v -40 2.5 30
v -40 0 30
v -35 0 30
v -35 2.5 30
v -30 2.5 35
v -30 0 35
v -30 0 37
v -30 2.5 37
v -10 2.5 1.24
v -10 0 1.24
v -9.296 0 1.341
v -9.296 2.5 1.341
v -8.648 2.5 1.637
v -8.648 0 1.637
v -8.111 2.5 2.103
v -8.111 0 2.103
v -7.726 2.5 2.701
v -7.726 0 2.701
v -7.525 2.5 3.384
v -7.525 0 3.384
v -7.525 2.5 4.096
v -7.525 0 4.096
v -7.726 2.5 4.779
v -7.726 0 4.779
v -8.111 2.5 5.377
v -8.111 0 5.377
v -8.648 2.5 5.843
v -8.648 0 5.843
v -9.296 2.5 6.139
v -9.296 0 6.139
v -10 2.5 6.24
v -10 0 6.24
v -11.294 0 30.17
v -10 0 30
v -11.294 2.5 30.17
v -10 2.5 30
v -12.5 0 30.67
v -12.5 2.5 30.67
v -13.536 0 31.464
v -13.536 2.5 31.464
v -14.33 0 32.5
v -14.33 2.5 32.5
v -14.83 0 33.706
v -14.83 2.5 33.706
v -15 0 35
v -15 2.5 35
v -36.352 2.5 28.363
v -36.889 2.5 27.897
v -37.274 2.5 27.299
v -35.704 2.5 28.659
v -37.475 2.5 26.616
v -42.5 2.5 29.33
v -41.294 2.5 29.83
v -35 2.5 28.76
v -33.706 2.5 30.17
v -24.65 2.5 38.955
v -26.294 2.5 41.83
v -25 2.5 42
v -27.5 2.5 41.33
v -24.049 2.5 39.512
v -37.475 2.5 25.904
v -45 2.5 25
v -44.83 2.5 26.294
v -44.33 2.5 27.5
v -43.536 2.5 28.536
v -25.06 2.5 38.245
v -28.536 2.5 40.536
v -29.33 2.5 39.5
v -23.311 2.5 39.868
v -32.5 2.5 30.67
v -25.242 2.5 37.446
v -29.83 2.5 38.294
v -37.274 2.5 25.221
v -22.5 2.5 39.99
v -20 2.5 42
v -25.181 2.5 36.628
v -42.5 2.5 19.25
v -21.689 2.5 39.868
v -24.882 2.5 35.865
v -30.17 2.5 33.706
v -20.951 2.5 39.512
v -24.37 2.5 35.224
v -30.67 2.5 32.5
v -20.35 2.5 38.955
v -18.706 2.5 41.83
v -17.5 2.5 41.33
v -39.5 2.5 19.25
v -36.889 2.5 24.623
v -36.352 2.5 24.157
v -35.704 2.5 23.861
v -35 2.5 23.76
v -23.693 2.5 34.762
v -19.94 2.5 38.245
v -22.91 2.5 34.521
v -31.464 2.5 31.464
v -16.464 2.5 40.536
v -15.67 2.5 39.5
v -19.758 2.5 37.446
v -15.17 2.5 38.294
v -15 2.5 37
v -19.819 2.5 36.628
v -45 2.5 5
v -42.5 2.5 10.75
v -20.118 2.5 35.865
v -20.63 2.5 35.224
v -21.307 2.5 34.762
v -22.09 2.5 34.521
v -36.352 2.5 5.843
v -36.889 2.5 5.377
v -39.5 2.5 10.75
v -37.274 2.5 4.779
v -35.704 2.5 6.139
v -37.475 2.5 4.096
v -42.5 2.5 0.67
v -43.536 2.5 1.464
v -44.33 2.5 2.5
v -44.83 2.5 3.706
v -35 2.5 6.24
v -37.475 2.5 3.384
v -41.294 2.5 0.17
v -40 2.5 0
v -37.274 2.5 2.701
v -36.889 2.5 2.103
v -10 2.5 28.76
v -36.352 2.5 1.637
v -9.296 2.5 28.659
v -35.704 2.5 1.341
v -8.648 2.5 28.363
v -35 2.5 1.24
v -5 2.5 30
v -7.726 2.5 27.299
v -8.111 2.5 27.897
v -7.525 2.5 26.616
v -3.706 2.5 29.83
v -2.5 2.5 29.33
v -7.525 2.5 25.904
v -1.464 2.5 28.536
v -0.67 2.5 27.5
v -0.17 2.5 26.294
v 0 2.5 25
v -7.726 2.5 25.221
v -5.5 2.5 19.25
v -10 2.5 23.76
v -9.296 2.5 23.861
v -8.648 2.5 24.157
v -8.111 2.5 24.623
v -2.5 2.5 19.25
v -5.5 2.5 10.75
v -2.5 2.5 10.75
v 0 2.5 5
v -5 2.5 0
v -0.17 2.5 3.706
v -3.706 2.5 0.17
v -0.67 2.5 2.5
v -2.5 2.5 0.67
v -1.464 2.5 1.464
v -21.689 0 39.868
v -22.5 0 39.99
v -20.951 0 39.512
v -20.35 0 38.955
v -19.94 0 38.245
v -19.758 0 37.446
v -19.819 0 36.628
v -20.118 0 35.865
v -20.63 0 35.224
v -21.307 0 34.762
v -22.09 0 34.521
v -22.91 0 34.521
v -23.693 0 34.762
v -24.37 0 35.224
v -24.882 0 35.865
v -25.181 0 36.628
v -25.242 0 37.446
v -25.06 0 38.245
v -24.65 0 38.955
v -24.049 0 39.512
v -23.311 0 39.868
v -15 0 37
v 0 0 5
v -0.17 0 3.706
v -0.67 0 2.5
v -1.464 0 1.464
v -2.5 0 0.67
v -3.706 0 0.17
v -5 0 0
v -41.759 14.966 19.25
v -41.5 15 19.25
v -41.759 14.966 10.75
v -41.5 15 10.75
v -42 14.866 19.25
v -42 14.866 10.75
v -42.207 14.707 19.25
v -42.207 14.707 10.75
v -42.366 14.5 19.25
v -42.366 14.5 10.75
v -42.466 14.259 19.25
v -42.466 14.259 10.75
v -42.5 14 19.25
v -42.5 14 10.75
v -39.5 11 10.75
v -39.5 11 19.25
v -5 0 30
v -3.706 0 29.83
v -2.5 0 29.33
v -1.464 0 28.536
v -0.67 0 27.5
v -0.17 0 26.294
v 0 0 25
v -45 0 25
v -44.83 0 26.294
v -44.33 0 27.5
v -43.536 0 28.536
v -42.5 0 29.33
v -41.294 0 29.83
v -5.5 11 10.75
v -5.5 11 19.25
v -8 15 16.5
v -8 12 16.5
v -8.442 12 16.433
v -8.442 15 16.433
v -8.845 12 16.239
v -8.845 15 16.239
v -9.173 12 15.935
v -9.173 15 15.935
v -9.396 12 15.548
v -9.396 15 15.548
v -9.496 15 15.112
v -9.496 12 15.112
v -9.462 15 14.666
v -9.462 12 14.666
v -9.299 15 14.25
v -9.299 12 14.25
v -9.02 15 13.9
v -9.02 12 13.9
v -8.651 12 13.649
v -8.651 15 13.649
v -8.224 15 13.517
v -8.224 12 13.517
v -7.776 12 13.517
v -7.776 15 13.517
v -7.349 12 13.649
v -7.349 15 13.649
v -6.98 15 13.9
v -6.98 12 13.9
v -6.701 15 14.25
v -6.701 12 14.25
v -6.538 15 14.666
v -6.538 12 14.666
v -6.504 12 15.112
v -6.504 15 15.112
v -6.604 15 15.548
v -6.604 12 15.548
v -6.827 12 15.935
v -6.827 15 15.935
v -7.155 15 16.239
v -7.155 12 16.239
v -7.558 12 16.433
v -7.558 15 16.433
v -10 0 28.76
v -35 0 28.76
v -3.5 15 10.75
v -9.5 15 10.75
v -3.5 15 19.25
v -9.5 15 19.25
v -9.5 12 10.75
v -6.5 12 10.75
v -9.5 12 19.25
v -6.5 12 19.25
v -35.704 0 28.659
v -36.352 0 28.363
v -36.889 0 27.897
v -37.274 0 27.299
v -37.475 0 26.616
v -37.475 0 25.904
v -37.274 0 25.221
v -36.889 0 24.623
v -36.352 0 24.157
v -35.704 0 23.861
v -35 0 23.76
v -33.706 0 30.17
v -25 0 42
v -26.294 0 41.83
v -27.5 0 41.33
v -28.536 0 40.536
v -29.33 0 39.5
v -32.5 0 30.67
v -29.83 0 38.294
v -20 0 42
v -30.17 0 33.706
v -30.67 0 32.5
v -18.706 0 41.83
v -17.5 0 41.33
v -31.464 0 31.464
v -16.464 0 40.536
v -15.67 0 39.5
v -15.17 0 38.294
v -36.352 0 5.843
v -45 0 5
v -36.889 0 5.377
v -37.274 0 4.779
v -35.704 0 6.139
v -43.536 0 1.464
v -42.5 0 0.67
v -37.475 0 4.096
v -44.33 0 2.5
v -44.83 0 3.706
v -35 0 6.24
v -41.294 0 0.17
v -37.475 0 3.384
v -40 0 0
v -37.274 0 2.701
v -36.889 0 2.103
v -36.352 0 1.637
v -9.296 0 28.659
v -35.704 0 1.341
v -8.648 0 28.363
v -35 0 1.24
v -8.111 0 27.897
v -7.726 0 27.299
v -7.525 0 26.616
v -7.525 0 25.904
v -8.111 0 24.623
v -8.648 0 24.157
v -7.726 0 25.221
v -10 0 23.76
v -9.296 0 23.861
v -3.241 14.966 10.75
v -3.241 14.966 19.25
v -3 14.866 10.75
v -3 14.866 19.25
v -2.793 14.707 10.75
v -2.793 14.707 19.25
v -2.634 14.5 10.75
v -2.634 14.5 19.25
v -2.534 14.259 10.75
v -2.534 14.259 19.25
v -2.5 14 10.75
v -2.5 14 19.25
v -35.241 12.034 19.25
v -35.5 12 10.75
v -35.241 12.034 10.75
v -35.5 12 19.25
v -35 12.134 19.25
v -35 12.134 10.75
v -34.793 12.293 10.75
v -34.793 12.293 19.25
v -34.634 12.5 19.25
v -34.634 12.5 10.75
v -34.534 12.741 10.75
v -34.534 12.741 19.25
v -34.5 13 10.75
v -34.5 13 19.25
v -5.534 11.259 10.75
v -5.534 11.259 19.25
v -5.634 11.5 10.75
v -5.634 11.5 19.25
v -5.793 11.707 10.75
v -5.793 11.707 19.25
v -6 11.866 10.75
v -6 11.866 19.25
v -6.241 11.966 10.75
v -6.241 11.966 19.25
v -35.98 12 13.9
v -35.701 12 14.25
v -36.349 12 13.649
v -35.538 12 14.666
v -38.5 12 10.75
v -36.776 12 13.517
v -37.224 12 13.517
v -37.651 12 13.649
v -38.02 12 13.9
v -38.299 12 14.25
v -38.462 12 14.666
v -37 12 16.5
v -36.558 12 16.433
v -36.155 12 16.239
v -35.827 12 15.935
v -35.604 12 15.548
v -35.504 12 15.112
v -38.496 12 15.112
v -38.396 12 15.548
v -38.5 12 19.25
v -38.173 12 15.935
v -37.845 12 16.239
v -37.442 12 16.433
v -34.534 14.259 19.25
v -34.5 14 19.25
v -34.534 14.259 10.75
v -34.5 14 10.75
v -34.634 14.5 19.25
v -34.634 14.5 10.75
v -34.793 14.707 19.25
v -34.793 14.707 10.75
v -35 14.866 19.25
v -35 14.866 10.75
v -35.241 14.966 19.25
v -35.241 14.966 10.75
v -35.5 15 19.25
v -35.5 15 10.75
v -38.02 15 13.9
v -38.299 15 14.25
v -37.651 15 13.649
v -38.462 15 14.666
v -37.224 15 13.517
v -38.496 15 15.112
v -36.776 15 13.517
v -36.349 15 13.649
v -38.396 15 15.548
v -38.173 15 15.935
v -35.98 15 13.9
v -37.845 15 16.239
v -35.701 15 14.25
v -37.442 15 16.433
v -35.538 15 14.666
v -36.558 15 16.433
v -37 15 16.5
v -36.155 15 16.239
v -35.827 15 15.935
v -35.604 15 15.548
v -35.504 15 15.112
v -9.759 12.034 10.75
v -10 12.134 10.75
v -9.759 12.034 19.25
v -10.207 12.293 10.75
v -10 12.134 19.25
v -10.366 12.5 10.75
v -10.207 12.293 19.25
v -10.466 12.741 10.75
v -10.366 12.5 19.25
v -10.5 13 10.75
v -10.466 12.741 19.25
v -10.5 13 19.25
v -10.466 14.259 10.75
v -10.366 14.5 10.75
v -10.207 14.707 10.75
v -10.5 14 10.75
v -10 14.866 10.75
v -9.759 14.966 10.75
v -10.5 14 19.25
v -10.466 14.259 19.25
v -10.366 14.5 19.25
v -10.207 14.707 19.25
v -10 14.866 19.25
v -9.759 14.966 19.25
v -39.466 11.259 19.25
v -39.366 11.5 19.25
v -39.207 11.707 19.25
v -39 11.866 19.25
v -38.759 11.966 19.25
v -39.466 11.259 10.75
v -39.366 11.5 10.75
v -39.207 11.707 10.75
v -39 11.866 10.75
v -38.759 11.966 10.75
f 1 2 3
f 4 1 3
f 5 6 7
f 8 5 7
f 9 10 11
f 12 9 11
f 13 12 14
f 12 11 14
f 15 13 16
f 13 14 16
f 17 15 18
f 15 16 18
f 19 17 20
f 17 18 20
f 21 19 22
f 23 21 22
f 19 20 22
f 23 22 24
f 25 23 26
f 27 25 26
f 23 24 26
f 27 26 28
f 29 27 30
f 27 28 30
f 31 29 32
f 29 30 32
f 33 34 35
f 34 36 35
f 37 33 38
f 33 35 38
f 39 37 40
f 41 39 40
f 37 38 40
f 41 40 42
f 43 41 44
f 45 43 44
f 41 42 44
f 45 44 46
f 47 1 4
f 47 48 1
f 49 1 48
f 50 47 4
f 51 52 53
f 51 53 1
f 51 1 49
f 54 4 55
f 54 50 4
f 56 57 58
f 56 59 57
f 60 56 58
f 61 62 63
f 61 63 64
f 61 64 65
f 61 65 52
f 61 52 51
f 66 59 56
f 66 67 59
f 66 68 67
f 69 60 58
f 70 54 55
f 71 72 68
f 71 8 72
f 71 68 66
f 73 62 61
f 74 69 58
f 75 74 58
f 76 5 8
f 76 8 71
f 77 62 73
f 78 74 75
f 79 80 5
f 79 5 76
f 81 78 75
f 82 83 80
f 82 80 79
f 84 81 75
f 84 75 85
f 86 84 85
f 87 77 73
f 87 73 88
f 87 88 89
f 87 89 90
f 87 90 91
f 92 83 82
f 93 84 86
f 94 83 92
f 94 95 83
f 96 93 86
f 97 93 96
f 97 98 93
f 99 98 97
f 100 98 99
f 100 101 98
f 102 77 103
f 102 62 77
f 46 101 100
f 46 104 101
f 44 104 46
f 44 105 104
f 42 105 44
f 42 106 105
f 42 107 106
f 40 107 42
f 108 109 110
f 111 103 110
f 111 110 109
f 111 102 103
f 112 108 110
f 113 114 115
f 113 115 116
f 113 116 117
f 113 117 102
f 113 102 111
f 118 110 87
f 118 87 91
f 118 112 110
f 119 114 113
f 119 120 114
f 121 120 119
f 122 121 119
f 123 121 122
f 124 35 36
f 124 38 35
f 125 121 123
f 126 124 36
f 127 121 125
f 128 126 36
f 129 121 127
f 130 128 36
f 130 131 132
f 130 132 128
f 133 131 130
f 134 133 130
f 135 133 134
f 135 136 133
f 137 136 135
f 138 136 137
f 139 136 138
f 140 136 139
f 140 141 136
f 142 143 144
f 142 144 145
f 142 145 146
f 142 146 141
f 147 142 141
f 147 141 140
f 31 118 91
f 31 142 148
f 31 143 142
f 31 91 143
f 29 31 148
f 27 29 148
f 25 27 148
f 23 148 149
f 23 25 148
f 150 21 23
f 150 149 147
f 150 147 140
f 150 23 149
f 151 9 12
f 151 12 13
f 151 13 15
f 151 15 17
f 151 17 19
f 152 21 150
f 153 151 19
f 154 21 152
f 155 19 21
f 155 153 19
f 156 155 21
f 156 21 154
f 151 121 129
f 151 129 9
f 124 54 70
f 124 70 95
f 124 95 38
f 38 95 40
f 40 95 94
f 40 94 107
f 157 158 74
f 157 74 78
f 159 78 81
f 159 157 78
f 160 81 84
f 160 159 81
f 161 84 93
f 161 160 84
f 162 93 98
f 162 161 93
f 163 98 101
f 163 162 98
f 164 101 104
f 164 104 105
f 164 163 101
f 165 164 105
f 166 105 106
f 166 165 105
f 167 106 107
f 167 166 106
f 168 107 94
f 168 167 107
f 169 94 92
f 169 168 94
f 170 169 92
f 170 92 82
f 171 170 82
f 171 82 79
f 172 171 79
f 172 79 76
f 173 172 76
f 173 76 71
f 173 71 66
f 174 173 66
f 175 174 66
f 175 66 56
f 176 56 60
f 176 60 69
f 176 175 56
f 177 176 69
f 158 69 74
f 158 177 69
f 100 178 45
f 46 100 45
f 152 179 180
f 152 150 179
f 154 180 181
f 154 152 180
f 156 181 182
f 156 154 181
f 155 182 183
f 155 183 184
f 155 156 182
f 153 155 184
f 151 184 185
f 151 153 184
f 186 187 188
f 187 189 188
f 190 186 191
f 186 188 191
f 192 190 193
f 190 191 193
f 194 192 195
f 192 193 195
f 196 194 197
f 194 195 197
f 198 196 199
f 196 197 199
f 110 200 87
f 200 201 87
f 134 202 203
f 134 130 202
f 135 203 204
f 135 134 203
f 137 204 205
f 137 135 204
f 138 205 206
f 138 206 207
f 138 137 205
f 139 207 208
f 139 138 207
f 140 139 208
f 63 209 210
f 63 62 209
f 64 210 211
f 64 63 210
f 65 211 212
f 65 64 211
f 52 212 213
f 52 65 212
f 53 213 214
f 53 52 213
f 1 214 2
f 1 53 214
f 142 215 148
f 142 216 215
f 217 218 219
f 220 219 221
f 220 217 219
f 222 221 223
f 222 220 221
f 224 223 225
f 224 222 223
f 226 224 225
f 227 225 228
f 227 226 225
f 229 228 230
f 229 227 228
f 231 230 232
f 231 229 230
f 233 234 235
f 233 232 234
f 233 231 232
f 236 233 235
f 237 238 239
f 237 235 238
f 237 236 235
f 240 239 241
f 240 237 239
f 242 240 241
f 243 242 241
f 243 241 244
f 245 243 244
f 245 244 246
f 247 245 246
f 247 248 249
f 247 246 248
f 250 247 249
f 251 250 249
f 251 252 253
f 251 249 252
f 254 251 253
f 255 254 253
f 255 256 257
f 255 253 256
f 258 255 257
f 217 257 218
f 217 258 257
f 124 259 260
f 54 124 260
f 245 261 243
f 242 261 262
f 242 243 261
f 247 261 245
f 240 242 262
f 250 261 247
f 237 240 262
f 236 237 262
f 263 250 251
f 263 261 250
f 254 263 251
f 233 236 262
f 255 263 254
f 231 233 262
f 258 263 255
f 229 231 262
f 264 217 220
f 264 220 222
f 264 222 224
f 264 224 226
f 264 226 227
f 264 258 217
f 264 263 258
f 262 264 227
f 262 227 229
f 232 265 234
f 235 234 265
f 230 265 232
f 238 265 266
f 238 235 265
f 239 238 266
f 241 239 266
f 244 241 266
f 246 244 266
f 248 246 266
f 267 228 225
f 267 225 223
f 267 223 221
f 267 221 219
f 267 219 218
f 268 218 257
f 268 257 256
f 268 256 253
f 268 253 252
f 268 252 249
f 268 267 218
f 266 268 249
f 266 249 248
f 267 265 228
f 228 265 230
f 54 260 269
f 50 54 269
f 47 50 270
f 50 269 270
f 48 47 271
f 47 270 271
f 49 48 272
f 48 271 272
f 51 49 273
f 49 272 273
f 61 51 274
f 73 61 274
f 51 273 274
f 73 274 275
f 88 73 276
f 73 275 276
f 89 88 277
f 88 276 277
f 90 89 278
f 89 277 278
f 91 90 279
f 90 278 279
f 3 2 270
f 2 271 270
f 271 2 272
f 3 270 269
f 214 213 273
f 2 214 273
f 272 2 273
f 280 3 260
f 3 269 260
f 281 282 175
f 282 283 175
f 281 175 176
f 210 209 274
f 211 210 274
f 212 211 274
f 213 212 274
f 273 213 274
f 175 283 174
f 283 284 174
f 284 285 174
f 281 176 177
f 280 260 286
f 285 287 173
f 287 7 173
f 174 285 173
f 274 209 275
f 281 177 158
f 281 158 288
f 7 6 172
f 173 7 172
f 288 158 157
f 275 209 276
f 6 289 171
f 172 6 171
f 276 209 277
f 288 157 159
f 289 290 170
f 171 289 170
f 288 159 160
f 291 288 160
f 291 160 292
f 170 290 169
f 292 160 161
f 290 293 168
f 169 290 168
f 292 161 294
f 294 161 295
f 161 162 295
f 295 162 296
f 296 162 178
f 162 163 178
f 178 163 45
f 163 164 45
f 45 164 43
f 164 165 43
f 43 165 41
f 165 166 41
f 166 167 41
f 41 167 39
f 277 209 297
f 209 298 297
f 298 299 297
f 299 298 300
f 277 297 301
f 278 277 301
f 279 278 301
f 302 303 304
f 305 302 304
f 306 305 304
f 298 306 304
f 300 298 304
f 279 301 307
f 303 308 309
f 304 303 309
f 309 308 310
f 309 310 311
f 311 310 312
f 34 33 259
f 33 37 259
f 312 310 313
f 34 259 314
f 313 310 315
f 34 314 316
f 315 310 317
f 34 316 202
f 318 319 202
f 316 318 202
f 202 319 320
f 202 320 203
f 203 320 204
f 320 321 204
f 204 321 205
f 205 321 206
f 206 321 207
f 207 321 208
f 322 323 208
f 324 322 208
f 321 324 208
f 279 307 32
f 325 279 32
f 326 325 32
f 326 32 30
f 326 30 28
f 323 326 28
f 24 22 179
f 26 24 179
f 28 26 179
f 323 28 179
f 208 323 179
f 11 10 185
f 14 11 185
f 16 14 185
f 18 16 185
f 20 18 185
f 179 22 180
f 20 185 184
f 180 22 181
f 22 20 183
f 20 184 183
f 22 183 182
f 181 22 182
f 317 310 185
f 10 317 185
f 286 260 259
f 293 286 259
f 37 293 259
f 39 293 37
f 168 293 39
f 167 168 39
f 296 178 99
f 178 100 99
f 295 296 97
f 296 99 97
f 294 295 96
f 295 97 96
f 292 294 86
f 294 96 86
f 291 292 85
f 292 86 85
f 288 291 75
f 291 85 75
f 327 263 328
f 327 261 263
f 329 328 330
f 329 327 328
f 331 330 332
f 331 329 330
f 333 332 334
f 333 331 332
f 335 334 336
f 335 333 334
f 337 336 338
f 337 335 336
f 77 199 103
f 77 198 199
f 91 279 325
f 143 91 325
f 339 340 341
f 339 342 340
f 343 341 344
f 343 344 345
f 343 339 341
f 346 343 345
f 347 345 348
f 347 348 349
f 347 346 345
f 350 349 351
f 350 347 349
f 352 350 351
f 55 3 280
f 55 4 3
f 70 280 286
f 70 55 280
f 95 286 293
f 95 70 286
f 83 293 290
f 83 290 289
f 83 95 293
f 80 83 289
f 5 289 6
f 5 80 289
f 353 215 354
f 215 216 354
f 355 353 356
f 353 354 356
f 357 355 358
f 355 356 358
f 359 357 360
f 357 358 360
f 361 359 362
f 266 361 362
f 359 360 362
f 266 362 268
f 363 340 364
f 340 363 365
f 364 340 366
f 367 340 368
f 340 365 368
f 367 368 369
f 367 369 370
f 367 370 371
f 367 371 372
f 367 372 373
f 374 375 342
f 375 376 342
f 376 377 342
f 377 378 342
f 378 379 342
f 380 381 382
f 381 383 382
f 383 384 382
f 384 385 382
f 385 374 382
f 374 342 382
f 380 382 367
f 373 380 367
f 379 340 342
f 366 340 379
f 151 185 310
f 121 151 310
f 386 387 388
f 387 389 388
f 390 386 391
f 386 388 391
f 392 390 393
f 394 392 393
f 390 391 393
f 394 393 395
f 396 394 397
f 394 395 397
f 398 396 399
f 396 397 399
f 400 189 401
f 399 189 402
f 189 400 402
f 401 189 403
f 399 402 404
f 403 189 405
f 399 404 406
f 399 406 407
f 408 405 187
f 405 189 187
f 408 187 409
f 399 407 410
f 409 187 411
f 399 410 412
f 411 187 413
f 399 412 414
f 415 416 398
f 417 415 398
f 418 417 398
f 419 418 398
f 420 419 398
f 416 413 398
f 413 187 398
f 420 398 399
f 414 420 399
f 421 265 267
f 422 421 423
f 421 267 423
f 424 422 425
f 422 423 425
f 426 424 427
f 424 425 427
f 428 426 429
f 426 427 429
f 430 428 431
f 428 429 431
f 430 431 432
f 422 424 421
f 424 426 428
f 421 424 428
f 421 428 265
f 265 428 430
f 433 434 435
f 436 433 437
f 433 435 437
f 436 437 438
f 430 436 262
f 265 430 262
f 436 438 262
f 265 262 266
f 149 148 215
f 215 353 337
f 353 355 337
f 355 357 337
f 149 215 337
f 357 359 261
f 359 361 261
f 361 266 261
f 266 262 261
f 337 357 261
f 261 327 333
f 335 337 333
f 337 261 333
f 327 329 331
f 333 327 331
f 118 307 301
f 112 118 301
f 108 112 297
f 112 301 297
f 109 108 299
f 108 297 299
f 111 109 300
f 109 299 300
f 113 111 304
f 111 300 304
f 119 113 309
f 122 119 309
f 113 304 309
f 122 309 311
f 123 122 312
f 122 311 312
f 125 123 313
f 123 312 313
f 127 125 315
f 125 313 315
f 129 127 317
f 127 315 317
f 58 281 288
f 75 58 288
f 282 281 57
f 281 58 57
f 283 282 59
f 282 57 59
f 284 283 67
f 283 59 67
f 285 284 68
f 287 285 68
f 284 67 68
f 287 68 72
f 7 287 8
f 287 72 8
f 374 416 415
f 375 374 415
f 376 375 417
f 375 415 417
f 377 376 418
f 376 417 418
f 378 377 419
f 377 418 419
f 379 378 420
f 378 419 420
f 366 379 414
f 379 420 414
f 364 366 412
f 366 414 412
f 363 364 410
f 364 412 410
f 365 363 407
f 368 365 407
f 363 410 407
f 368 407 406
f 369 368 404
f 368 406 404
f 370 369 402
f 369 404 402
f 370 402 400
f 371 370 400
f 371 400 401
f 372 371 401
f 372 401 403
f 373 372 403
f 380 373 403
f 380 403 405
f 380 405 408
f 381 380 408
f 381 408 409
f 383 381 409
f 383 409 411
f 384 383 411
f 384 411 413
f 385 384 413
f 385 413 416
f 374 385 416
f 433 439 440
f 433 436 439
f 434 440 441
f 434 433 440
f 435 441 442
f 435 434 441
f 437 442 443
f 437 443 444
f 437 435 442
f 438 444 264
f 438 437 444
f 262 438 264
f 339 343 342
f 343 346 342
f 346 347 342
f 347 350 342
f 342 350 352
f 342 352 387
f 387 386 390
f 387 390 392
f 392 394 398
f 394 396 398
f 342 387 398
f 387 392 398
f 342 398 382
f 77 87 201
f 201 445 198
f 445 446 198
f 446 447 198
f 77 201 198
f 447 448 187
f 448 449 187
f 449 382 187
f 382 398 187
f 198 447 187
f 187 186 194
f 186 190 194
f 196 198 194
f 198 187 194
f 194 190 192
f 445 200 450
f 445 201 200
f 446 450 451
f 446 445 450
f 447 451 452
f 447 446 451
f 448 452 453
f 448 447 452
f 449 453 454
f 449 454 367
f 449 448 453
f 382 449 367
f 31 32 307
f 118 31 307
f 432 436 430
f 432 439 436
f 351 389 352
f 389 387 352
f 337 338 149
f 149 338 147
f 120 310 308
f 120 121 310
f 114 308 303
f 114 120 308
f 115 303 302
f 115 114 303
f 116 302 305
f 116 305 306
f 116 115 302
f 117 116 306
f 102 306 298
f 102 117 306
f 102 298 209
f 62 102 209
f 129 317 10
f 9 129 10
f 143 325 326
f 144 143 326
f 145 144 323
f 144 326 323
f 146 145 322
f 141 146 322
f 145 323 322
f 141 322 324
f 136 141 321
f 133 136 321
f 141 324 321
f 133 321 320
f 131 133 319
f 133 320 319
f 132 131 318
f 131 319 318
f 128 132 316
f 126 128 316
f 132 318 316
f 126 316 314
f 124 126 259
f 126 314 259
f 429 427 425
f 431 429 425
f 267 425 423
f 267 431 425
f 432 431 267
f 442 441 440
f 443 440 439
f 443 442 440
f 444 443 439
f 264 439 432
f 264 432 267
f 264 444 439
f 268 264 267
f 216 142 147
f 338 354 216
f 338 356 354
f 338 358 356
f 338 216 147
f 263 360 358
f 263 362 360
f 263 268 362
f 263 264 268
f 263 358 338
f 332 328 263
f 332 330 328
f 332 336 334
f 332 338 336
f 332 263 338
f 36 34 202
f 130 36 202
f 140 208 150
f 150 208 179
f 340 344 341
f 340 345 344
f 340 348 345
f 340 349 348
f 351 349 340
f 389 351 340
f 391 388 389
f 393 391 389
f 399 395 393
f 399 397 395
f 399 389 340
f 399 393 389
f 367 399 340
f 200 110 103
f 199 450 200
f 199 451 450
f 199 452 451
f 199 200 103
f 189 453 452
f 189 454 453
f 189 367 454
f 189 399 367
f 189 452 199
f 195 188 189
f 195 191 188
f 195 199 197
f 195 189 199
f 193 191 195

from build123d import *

# Parameters (mm, degrees)
SKETCH1_R            = 2.7499999999999987
BOSS_EXTRUDE1_DEPTH  = 2.5
BOSS_EXTRUDE3_DEPTH  = 4.25
SKETCH5_R            = 1.4999999999999967
CUT_EXTRUDE1_DEPTH   = 5
FILLET1_R            = 1
FILLET2_R            = 1
FILLET3_R            = 1
FILLET4_R            = 1
FILLET1_OF_MIRROR1_R = 1
FILLET2_OF_MIRROR1_R = 1
FILLET3_OF_MIRROR1_R = 1
FILLET4_OF_MIRROR1_R = 1
FILLET5_R            = 5
FILLET6_R            = 5


with BuildPart() as part:
    # Sketch1 → Boss-Extrude1 (new body)
    with BuildSketch(Plane(origin=(0, 0, 0), x_dir=(1, 0, 0), z_dir=(0, 1, 0))):
        Polygon((0, 0), (-30, 0), (-45, -5.51e-15), (-45, -30), (-29.999999999999996, -30), (-30, -42), (-15, -42), (-15, -30.000000000000004), (0, -30), align=None)
        with Locations(Location((-22.5, -37.239999999999995, 0), (0, 0, 270))):
            Circle(SKETCH1_R, mode=Mode.SUBTRACT)
        with BuildLine():
            Line((-34.99999999999999, -1.239999999999998), (-10.000000000000002, -1.240000000000011))
            ThreePointArc((-10.000000000000002, -1.240000000000011), (-7.500000000000012, -3.7400000000000007), (-10.000000000000002, -6.2399999999999896))
            Line((-10.000000000000002, -6.2399999999999896), (-34.99999999999999, -6.240000000000009))
            ThreePointArc((-34.99999999999999, -6.240000000000009), (-37.5, -3.7400000000000015), (-34.99999999999999, -1.239999999999998))
        make_face(mode=Mode.SUBTRACT)
        with BuildLine():
            Line((-34.99999999999999, -23.75999999999999), (-10.000000000000002, -23.76000000000001))
            ThreePointArc((-10.000000000000002, -23.76000000000001), (-7.500000000000012, -26.259999999999998), (-10.000000000000002, -28.759999999999987))
            Line((-10.000000000000002, -28.759999999999987), (-34.99999999999999, -28.76))
            ThreePointArc((-34.99999999999999, -28.76), (-37.5, -26.259999999999998), (-34.99999999999999, -23.75999999999999))
        make_face(mode=Mode.SUBTRACT)
    extrude(amount=BOSS_EXTRUDE1_DEPTH)

    # Sketch3 → Boss-Extrude3 (add, symmetric)
    with BuildSketch(Plane.XY.offset(14.999999999999995)):
        Polygon((-39.5, 2.5), (-42.5, 2.5000000000000004), (-42.5, 12), (-42.5, 15.000000000000007), (-34.5, 15.000000000000004), (-34.5, 12), (-39.5, 12), align=None)
    boss_extrude3 = extrude(amount=BOSS_EXTRUDE3_DEPTH, both=True)

    # Sketch5 → Cut-Extrude1 (cut)
    with BuildSketch(Plane(origin=(6.51e-15, 14.999999999999988, 0), x_dir=(1, 0, 0), z_dir=(0, 1, 0))):
        with Locations(Location((-36.99999999999999, -15, 0), (0, 0, 270))):
            Circle(SKETCH5_R)
    cut_extrude1 = extrude(amount=-CUT_EXTRUDE1_DEPTH, mode=Mode.SUBTRACT)

    # Fillet1
    fillet1_edges = [part.edges().sort_by_distance(p)[0] for p in [
        (-39.49999999999999, 12, 14.999999999999993),
    ]]
    fillet(fillet1_edges, radius=FILLET1_R)

    # Fillet2
    fillet2_edges = [part.edges().sort_by_distance(p)[0] for p in [
        (-34.49999999999999, 12, 14.999999999999993),
    ]]
    fillet(fillet2_edges, radius=FILLET2_R - 0.0001)  # a hair under: the kernel refuses the full size

    # Fillet3
    fillet3_edges = [part.edges().sort_by_distance(p)[0] for p in [
        (-34.49999999999999, 15.000000000000004, 14.999999999999993),
    ]]
    fillet(fillet3_edges, radius=FILLET3_R - 0.0001)  # a hair under: the kernel refuses the full size

    # Fillet4
    fillet4_edges = [part.edges().sort_by_distance(p)[0] for p in [
        (-42.49999999999999, 15.000000000000007, 14.999999999999993),
    ]]
    fillet(fillet4_edges, radius=FILLET4_R)

    # Mirror1: Boss-Extrude3, Cut-Extrude1 across plane
    add(boss_extrude3.mirror(Plane(origin=(-22.5, 0, 0), x_dir=(6e-17, 0, 1), z_dir=(1, 0, -6e-17))))
    add(cut_extrude1.mirror(Plane(origin=(-22.5, 0, 0), x_dir=(6e-17, 0, 1), z_dir=(1, 0, -6e-17))), mode=Mode.SUBTRACT)

    # Fillet1 of Mirror1
    fillet1_of_mirror1_edges = [part.edges().sort_by_distance(p)[0] for p in [
        (-5.500000000000007, 12, 14.999999999999991),
    ]]
    fillet(fillet1_of_mirror1_edges, radius=FILLET1_OF_MIRROR1_R)

    # Fillet2 of Mirror1
    fillet2_of_mirror1_edges = [part.edges().sort_by_distance(p)[0] for p in [
        (-10.500000000000007, 12, 14.999999999999993),
    ]]
    fillet(fillet2_of_mirror1_edges, radius=FILLET2_OF_MIRROR1_R - 0.0001)  # a hair under: the kernel refuses the full size

    # Fillet3 of Mirror1
    fillet3_of_mirror1_edges = [part.edges().sort_by_distance(p)[0] for p in [
        (-10.500000000000007, 15.000000000000004, 14.999999999999993),
    ]]
    fillet(fillet3_of_mirror1_edges, radius=FILLET3_OF_MIRROR1_R - 0.0001)  # a hair under: the kernel refuses the full size

    # Fillet4 of Mirror1
    fillet4_of_mirror1_edges = [part.edges().sort_by_distance(p)[0] for p in [
        (-2.500000000000007, 15.000000000000007, 14.999999999999991),
    ]]
    fillet(fillet4_of_mirror1_edges, radius=FILLET4_OF_MIRROR1_R)

    # Fillet5
    fillet5_edges = [part.edges().sort_by_distance(p)[0] for p in [
        (-15, 1.25, 30.000000000000004),
        (-29.999999999999996, 1.25, 30),
    ]]
    fillet(fillet5_edges, radius=FILLET5_R)

    # Fillet6
    fillet6_edges = [part.edges().sort_by_distance(p)[0] for p in [
        (0, 1.25, 30),
        (-15, 1.25, 42),
        (-30, 1.25, 42),
        (-45, 1.25, 30),
        (-45, 1.25, 5.51e-15),
        (0, 1.25, 0),
    ]]
    fillet(fillet6_edges, radius=FILLET6_R)


solid = part.part
